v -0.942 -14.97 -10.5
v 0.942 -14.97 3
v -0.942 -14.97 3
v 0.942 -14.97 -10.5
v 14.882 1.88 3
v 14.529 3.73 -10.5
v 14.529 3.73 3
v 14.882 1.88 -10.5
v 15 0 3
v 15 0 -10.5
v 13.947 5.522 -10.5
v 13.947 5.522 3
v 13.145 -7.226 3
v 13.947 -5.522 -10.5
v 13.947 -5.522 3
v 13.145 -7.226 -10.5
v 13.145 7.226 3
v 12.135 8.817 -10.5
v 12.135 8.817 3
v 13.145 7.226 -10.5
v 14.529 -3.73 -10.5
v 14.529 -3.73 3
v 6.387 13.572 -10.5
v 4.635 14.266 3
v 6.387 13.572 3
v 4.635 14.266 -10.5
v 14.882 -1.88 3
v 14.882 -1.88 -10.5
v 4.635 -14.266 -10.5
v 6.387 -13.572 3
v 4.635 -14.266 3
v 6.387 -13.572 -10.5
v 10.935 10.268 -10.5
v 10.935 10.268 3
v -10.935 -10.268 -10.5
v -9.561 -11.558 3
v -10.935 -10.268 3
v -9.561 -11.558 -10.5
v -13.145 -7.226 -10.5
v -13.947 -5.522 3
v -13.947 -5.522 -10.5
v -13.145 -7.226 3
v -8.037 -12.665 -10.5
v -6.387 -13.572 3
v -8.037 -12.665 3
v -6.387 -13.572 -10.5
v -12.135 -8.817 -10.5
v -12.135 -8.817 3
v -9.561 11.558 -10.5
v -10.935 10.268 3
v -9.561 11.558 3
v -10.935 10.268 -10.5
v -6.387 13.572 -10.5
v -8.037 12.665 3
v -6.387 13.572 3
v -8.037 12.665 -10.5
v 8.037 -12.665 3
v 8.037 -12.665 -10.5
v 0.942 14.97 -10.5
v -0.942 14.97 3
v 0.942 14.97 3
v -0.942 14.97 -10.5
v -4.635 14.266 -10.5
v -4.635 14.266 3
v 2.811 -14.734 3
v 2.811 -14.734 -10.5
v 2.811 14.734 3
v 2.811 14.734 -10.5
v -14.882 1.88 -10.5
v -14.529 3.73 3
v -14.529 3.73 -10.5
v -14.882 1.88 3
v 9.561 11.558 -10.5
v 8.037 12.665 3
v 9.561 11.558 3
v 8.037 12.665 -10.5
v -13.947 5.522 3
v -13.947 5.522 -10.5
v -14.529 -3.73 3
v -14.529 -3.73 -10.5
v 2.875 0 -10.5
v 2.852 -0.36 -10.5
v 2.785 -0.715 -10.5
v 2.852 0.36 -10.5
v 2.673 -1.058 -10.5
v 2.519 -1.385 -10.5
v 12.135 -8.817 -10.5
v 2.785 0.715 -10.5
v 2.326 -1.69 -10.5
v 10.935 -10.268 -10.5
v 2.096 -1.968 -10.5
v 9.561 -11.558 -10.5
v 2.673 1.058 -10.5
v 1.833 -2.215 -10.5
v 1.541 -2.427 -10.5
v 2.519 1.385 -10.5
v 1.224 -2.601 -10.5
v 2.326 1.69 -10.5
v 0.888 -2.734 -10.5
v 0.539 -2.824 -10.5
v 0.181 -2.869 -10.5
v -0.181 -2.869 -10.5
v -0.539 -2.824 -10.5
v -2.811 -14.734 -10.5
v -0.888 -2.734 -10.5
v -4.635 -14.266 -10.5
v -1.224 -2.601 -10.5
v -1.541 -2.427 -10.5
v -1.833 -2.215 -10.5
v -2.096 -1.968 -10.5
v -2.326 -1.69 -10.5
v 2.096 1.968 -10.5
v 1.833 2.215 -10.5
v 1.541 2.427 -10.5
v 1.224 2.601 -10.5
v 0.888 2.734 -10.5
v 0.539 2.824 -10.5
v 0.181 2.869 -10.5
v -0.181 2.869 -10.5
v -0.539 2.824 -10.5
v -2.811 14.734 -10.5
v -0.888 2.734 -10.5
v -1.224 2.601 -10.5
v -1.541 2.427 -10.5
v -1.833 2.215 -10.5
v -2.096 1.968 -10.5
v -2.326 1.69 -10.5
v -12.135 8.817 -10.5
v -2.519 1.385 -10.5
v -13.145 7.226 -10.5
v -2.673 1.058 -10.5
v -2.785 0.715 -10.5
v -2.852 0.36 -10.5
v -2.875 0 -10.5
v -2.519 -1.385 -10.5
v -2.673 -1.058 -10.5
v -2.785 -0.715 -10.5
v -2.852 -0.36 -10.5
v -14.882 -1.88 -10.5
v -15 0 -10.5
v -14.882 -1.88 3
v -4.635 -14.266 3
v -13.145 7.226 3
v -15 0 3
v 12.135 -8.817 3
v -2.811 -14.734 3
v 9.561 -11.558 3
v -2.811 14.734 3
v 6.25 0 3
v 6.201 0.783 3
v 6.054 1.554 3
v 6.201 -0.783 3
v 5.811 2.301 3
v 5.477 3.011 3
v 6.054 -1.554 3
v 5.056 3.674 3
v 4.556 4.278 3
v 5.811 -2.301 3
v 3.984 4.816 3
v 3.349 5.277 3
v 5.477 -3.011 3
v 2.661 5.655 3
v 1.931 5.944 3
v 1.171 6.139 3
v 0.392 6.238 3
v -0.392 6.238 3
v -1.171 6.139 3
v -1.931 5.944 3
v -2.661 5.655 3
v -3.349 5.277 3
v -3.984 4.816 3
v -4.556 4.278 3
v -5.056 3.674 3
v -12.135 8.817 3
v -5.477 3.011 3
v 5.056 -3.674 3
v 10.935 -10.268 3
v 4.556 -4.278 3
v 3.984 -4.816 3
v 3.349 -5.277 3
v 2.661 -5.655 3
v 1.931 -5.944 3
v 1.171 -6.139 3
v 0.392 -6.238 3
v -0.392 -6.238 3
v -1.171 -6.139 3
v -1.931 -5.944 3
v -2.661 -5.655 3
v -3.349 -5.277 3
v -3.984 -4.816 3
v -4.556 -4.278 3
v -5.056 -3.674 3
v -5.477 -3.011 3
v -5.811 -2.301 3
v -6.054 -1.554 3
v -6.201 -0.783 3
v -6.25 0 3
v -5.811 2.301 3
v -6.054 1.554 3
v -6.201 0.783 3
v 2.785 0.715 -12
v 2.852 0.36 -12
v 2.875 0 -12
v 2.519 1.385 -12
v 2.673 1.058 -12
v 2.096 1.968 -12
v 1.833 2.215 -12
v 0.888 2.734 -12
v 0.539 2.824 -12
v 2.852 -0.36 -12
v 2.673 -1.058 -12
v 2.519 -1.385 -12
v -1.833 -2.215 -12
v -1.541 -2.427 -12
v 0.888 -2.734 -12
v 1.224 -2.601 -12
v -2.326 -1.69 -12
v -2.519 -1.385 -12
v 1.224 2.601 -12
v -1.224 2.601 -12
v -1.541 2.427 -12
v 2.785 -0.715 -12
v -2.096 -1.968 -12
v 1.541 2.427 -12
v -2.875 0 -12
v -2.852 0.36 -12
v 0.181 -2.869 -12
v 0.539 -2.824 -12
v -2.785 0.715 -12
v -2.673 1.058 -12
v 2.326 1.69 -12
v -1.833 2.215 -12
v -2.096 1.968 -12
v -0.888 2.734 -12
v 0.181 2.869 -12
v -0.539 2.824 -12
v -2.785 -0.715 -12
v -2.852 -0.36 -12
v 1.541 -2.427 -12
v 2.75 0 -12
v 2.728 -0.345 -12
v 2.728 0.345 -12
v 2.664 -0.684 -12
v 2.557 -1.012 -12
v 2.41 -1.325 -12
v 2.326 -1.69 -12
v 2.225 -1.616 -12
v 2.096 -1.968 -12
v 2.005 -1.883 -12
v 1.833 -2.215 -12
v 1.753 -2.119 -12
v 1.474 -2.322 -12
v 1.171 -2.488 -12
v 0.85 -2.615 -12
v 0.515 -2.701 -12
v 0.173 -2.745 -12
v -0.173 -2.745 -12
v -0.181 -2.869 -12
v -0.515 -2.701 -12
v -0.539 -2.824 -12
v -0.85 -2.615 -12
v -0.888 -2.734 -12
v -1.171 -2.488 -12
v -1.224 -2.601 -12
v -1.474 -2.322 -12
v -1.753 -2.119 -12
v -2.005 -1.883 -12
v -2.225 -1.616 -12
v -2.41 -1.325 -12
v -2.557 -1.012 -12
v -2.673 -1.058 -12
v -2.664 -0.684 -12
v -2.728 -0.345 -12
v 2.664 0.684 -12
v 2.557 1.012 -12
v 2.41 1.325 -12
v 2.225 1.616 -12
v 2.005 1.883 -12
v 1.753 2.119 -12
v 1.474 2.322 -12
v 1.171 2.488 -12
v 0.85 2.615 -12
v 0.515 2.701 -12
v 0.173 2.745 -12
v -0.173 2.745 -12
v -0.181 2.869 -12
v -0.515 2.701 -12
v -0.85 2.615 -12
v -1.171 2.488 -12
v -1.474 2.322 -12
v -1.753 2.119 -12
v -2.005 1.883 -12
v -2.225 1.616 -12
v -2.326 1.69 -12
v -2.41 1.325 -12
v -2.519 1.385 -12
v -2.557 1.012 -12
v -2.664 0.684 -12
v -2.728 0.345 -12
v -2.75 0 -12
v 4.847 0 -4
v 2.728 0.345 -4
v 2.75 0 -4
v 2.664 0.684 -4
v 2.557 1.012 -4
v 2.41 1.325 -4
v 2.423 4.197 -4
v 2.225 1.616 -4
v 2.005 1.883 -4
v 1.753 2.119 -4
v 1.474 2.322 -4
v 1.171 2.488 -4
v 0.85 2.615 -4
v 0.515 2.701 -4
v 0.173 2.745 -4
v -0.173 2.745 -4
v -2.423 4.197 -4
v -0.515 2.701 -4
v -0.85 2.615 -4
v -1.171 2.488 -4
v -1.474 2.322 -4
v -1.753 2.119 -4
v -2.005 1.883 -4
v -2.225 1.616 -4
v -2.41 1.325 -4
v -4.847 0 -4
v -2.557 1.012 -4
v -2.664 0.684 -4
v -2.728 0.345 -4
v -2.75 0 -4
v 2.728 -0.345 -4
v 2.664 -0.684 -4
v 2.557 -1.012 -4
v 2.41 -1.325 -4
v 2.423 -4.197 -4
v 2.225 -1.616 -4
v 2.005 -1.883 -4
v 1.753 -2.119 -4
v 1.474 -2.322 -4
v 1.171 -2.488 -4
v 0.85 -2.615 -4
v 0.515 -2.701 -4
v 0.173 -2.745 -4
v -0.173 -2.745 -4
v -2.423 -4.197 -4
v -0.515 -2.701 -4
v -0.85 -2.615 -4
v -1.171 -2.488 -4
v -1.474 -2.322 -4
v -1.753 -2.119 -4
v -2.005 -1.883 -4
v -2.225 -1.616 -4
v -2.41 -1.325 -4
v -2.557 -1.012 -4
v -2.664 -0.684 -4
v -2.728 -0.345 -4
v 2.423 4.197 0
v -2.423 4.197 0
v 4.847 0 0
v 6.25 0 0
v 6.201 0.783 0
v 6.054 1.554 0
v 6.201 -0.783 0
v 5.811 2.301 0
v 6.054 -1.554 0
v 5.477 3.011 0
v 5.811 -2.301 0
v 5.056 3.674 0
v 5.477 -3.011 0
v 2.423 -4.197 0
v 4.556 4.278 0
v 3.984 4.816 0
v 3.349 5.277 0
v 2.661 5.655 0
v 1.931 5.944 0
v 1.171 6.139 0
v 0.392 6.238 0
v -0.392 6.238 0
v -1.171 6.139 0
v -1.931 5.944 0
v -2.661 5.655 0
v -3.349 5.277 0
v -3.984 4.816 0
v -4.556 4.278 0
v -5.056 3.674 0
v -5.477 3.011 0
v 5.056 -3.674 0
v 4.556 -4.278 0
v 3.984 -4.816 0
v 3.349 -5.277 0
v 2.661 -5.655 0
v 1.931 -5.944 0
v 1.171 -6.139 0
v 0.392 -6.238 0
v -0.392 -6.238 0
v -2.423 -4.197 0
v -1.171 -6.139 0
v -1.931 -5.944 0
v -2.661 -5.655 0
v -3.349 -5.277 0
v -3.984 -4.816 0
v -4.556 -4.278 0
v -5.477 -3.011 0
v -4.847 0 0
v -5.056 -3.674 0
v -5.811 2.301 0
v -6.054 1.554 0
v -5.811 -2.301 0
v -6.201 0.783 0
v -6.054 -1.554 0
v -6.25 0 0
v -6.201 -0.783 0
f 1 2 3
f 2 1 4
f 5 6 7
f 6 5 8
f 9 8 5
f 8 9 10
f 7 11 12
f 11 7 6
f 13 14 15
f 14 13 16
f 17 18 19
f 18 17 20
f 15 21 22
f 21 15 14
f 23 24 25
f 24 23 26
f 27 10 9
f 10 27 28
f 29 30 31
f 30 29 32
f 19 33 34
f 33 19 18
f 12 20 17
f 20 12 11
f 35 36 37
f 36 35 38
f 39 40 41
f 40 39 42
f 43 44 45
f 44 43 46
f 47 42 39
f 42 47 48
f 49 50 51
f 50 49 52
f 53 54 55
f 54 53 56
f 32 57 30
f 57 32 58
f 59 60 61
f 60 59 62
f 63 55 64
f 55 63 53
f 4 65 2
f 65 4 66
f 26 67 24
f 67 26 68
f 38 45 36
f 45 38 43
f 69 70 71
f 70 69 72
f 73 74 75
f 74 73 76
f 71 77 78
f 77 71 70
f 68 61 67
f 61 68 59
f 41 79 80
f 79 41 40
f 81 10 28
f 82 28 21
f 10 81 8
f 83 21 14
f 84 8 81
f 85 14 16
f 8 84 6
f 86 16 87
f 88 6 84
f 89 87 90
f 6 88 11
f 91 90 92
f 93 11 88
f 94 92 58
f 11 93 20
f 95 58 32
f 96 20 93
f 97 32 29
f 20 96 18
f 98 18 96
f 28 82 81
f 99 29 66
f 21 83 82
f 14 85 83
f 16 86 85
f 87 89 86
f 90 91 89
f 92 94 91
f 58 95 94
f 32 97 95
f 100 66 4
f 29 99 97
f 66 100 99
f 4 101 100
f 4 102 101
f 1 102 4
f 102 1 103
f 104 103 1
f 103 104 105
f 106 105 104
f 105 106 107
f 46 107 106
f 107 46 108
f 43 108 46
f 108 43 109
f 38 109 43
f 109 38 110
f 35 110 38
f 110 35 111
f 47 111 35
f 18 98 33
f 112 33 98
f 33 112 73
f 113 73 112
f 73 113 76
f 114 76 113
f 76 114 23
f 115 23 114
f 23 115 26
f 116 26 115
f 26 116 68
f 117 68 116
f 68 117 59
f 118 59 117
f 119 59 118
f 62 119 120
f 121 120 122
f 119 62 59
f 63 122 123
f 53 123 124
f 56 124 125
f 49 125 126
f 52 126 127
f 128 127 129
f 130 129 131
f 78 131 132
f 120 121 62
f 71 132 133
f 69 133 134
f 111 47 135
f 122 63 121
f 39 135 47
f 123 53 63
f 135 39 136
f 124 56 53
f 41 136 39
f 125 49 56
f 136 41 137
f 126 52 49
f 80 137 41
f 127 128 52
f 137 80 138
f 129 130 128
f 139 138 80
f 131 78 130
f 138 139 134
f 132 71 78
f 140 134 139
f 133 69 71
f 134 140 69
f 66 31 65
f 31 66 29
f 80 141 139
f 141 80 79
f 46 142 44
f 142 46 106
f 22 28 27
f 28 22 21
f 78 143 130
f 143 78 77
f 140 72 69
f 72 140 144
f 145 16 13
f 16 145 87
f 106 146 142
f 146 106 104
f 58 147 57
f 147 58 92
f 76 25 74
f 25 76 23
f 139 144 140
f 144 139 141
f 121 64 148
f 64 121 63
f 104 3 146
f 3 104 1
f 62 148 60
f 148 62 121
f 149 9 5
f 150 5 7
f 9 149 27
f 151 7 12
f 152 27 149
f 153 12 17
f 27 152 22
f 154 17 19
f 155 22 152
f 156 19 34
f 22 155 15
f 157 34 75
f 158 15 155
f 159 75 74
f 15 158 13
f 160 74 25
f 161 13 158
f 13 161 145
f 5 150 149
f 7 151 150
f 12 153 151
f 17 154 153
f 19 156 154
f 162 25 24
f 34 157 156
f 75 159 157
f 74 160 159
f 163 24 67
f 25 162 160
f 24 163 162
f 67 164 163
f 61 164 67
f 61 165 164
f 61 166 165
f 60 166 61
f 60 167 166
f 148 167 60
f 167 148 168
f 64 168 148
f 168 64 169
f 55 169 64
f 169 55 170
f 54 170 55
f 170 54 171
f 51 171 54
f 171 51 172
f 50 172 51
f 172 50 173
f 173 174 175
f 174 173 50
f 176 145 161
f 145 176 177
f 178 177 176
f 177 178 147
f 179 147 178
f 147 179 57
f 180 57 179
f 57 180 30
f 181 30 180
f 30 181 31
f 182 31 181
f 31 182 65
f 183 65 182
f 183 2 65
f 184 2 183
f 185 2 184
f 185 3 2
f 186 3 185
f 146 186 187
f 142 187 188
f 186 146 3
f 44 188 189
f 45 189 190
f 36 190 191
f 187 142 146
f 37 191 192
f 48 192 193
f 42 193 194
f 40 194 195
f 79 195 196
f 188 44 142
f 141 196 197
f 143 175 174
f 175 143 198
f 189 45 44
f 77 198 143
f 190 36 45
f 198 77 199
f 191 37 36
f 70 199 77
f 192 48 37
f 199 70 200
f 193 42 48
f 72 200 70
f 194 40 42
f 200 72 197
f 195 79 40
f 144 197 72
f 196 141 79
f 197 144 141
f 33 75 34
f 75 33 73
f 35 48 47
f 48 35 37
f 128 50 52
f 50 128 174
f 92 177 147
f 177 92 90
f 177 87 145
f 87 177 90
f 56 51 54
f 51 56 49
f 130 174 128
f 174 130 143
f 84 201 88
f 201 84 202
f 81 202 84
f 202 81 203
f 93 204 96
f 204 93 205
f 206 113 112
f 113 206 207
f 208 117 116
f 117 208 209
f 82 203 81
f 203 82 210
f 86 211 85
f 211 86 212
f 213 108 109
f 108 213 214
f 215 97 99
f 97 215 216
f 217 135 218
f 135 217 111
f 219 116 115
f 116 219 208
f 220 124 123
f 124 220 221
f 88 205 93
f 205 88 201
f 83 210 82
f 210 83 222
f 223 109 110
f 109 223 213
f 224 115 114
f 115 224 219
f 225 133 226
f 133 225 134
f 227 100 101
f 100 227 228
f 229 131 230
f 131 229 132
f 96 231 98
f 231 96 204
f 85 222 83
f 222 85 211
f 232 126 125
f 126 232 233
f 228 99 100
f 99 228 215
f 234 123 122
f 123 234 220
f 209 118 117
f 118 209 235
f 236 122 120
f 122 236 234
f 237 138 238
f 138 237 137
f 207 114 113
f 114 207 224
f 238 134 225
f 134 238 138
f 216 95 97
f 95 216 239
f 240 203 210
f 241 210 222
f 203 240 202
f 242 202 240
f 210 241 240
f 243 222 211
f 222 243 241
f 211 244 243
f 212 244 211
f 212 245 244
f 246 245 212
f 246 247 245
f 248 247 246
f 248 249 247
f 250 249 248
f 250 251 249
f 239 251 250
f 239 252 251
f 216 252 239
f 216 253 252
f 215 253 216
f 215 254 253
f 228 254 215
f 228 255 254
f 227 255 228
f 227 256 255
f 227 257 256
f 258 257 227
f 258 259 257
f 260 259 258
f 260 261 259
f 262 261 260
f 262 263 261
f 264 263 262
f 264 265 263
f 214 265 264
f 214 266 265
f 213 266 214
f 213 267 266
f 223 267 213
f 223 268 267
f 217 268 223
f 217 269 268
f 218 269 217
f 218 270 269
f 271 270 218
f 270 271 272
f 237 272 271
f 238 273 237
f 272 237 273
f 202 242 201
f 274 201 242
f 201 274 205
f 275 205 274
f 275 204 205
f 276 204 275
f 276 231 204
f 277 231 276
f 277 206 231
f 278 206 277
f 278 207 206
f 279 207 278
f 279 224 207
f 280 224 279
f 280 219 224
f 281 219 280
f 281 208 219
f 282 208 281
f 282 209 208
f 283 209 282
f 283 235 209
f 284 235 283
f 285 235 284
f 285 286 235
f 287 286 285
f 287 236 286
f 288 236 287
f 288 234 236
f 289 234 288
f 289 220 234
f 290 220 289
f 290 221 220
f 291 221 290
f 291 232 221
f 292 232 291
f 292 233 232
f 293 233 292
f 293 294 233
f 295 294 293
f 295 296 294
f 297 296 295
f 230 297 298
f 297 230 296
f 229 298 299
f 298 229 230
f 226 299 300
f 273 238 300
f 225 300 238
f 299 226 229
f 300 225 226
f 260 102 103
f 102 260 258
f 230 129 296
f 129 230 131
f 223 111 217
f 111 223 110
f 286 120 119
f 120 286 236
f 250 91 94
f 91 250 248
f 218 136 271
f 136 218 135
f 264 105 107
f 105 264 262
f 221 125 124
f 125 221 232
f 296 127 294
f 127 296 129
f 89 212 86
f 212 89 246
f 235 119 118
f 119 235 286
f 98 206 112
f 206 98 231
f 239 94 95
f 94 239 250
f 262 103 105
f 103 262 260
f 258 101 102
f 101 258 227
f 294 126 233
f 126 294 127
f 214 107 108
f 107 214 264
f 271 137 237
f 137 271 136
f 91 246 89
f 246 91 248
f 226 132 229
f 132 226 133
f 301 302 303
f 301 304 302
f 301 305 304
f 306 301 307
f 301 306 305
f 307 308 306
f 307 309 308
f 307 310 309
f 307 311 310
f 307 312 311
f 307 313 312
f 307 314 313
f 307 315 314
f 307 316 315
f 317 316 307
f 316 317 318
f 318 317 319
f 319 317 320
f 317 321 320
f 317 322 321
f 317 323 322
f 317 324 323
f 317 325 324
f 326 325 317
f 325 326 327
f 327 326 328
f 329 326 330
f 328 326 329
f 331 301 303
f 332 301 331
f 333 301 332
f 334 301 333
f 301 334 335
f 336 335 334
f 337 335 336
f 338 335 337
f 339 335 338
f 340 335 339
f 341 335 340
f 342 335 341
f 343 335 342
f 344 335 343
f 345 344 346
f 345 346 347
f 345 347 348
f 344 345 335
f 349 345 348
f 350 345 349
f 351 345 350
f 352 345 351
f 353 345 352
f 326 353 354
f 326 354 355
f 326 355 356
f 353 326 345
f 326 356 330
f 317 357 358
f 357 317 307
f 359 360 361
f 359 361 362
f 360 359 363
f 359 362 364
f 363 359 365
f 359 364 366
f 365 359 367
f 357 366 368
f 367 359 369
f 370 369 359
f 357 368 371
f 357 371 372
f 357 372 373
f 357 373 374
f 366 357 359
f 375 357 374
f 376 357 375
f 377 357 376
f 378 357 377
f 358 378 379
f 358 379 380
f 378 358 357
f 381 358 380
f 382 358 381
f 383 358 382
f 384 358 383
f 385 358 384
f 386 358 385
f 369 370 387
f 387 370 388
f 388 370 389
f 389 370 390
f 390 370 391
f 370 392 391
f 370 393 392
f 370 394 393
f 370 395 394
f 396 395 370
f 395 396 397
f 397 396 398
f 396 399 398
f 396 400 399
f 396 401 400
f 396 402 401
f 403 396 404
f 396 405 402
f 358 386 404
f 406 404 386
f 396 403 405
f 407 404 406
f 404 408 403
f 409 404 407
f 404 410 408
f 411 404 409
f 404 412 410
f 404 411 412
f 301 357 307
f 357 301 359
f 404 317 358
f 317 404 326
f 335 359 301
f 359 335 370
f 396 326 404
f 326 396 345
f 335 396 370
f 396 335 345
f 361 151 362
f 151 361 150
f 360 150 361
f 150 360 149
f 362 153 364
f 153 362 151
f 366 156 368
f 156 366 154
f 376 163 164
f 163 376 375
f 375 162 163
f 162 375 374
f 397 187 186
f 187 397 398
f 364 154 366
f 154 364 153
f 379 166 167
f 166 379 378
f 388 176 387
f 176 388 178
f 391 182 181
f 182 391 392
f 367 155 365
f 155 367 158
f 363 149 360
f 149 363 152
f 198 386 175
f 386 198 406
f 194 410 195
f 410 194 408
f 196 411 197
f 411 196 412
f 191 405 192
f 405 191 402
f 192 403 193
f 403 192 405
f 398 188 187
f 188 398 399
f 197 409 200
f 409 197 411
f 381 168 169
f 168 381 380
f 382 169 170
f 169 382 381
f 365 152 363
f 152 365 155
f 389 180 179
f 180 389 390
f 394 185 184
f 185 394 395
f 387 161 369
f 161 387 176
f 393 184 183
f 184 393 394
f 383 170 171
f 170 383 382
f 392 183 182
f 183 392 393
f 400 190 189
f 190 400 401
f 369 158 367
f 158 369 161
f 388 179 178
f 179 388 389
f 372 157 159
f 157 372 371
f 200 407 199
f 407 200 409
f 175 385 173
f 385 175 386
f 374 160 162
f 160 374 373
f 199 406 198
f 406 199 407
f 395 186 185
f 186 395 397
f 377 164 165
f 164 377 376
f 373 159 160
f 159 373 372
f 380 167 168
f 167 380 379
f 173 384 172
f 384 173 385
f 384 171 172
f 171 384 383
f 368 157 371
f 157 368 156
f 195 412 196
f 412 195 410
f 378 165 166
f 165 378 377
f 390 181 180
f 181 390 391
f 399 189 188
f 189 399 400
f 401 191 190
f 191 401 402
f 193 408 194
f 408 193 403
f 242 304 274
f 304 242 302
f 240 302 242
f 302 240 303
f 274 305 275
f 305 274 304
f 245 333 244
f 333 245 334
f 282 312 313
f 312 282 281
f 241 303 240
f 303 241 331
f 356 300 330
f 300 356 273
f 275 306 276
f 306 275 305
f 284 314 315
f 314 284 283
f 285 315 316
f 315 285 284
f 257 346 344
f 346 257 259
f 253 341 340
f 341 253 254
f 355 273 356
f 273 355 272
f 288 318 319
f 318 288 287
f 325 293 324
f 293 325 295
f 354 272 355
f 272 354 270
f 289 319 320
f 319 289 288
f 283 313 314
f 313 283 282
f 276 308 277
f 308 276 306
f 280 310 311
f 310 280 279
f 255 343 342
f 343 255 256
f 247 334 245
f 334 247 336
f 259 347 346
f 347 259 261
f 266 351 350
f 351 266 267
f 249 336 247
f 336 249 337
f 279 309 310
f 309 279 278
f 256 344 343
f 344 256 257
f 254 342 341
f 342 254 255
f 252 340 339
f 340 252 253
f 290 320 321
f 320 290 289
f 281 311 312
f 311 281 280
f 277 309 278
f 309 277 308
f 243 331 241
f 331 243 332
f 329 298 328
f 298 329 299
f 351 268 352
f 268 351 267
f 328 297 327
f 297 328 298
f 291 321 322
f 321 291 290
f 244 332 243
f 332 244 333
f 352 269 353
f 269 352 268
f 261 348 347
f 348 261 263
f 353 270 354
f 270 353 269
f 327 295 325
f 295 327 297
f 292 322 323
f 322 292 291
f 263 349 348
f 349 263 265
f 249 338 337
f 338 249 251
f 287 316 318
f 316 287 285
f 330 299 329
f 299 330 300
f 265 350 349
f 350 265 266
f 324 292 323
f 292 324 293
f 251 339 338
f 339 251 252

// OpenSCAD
$fn = 50;


difference() {
	union() {
		translate(v = [0, 0, -10.5000000000]) {
			cylinder(h = 13.5000000000, r = 15.0000000000);
		}
		#translate(v = [0, 0, -12.0000000000]) {
			cylinder(h = 12, r = 2.8750000000);
		}
	}
	union() {
		translate(v = [0, 0, 0]) {
			rotate(a = [0, 0, 0]) {
				difference() {
					union() {
						translate(v = [0, 0, -4]) {
							linear_extrude(height = 4) {
								polygon(points = [[4.8468000000, 0.0000000000], [2.4234000000, 4.1974519271], [-2.4234000000, 4.1974519271], [-4.8468000000, 0.0000000000], [-2.4234000000, -4.1974519271], [2.4234000000, -4.1974519271]]);
							}
						}
					}
					union();
				}
			}
		}
		#cylinder(h = 3, r = 6.2500000000);
		#translate(v = [0, 0, -100.0000000000]) {
			cylinder(h = 200, r = 2.7500000000);
		}
	}
}
